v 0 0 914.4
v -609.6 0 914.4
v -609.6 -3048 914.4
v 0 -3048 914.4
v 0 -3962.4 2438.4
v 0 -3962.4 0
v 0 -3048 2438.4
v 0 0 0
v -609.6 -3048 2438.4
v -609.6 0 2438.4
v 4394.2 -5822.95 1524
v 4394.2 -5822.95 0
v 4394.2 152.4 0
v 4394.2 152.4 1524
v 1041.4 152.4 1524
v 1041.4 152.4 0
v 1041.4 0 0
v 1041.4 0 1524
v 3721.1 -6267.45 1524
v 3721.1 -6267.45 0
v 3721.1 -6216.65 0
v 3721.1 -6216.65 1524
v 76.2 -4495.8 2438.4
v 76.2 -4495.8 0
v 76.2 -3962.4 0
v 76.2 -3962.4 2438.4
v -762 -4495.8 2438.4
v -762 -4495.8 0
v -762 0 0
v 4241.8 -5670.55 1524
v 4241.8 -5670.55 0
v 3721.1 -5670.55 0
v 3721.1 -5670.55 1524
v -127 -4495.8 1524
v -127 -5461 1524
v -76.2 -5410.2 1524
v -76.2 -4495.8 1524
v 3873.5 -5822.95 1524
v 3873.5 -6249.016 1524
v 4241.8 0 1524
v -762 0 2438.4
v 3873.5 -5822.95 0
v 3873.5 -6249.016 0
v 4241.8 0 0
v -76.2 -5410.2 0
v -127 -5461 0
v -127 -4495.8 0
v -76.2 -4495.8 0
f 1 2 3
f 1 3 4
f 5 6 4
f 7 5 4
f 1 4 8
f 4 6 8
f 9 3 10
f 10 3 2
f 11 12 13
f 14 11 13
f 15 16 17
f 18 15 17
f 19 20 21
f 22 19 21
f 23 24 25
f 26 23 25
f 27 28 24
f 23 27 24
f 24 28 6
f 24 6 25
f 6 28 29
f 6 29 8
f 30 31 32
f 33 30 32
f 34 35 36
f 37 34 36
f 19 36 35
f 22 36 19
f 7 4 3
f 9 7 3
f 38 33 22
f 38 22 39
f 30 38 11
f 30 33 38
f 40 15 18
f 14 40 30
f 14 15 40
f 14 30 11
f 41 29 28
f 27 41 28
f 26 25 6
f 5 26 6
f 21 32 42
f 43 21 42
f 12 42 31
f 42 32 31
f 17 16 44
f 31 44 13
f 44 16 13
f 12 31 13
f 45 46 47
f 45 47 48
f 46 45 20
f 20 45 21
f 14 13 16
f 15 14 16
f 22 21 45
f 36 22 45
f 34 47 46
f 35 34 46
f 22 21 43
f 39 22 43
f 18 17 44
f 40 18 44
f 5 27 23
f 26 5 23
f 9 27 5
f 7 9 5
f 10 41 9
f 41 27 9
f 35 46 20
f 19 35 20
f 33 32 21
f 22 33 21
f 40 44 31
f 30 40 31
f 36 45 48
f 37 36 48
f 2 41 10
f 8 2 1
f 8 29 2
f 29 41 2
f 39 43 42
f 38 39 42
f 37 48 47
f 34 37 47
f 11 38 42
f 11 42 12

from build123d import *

# Parameters (mm, degrees)
F1_DEPTH = 2438.4
F2_DEPTH = 1524
F0_W     = 609.6
F0_H     = 3048
F3_DEPTH = 914.4
F4_DEPTH = 1524


with BuildPart() as f1:
    # F0 (on Top) → F1 (new body)
    with BuildSketch(Plane.XY):
        Polygon((0, -3962.4), (0, -3048), (-609.6, -3048), (-609.6, 0), (-762, 0), (-762, -4495.8), (-127, -4495.8), (-76.2, -4495.8), (76.2, -4495.8), (76.2, -3962.4), align=None)
    extrude(amount=F1_DEPTH)

    # F0 (on Top) → F3 (join)
    with BuildSketch(Plane.XY):
        with Locations((-304.8, -1524)):
            Rectangle(F0_W, F0_H)
    extrude(amount=F3_DEPTH)


with BuildPart() as f2:
    # F0 (on Top) → F2 (new body)
    with BuildSketch(Plane.XY):
        Polygon((-76.2, -4495.8), (-127, -4495.8), (-127, -5461), (3721.1, -6267.45), (3721.1, -6216.65), (-76.2, -5410.2), align=None)
    extrude(amount=F2_DEPTH)


with BuildPart() as f4:
    # F0 (on Top) → F4 (new body)
    with BuildSketch(Plane.XY):
        Polygon((3721.1, -5670.55), (3721.1, -6216.65), (3873.5, -6249.015886), (3873.5, -5822.95), (4394.2, -5822.95), (4394.2, 152.4), (1041.4, 152.4), (1041.4, 0), (4241.8, 0), (4241.8, -5670.55), align=None)
    extrude(amount=F4_DEPTH)


solid = Compound([f1.part, f2.part, f4.part])
